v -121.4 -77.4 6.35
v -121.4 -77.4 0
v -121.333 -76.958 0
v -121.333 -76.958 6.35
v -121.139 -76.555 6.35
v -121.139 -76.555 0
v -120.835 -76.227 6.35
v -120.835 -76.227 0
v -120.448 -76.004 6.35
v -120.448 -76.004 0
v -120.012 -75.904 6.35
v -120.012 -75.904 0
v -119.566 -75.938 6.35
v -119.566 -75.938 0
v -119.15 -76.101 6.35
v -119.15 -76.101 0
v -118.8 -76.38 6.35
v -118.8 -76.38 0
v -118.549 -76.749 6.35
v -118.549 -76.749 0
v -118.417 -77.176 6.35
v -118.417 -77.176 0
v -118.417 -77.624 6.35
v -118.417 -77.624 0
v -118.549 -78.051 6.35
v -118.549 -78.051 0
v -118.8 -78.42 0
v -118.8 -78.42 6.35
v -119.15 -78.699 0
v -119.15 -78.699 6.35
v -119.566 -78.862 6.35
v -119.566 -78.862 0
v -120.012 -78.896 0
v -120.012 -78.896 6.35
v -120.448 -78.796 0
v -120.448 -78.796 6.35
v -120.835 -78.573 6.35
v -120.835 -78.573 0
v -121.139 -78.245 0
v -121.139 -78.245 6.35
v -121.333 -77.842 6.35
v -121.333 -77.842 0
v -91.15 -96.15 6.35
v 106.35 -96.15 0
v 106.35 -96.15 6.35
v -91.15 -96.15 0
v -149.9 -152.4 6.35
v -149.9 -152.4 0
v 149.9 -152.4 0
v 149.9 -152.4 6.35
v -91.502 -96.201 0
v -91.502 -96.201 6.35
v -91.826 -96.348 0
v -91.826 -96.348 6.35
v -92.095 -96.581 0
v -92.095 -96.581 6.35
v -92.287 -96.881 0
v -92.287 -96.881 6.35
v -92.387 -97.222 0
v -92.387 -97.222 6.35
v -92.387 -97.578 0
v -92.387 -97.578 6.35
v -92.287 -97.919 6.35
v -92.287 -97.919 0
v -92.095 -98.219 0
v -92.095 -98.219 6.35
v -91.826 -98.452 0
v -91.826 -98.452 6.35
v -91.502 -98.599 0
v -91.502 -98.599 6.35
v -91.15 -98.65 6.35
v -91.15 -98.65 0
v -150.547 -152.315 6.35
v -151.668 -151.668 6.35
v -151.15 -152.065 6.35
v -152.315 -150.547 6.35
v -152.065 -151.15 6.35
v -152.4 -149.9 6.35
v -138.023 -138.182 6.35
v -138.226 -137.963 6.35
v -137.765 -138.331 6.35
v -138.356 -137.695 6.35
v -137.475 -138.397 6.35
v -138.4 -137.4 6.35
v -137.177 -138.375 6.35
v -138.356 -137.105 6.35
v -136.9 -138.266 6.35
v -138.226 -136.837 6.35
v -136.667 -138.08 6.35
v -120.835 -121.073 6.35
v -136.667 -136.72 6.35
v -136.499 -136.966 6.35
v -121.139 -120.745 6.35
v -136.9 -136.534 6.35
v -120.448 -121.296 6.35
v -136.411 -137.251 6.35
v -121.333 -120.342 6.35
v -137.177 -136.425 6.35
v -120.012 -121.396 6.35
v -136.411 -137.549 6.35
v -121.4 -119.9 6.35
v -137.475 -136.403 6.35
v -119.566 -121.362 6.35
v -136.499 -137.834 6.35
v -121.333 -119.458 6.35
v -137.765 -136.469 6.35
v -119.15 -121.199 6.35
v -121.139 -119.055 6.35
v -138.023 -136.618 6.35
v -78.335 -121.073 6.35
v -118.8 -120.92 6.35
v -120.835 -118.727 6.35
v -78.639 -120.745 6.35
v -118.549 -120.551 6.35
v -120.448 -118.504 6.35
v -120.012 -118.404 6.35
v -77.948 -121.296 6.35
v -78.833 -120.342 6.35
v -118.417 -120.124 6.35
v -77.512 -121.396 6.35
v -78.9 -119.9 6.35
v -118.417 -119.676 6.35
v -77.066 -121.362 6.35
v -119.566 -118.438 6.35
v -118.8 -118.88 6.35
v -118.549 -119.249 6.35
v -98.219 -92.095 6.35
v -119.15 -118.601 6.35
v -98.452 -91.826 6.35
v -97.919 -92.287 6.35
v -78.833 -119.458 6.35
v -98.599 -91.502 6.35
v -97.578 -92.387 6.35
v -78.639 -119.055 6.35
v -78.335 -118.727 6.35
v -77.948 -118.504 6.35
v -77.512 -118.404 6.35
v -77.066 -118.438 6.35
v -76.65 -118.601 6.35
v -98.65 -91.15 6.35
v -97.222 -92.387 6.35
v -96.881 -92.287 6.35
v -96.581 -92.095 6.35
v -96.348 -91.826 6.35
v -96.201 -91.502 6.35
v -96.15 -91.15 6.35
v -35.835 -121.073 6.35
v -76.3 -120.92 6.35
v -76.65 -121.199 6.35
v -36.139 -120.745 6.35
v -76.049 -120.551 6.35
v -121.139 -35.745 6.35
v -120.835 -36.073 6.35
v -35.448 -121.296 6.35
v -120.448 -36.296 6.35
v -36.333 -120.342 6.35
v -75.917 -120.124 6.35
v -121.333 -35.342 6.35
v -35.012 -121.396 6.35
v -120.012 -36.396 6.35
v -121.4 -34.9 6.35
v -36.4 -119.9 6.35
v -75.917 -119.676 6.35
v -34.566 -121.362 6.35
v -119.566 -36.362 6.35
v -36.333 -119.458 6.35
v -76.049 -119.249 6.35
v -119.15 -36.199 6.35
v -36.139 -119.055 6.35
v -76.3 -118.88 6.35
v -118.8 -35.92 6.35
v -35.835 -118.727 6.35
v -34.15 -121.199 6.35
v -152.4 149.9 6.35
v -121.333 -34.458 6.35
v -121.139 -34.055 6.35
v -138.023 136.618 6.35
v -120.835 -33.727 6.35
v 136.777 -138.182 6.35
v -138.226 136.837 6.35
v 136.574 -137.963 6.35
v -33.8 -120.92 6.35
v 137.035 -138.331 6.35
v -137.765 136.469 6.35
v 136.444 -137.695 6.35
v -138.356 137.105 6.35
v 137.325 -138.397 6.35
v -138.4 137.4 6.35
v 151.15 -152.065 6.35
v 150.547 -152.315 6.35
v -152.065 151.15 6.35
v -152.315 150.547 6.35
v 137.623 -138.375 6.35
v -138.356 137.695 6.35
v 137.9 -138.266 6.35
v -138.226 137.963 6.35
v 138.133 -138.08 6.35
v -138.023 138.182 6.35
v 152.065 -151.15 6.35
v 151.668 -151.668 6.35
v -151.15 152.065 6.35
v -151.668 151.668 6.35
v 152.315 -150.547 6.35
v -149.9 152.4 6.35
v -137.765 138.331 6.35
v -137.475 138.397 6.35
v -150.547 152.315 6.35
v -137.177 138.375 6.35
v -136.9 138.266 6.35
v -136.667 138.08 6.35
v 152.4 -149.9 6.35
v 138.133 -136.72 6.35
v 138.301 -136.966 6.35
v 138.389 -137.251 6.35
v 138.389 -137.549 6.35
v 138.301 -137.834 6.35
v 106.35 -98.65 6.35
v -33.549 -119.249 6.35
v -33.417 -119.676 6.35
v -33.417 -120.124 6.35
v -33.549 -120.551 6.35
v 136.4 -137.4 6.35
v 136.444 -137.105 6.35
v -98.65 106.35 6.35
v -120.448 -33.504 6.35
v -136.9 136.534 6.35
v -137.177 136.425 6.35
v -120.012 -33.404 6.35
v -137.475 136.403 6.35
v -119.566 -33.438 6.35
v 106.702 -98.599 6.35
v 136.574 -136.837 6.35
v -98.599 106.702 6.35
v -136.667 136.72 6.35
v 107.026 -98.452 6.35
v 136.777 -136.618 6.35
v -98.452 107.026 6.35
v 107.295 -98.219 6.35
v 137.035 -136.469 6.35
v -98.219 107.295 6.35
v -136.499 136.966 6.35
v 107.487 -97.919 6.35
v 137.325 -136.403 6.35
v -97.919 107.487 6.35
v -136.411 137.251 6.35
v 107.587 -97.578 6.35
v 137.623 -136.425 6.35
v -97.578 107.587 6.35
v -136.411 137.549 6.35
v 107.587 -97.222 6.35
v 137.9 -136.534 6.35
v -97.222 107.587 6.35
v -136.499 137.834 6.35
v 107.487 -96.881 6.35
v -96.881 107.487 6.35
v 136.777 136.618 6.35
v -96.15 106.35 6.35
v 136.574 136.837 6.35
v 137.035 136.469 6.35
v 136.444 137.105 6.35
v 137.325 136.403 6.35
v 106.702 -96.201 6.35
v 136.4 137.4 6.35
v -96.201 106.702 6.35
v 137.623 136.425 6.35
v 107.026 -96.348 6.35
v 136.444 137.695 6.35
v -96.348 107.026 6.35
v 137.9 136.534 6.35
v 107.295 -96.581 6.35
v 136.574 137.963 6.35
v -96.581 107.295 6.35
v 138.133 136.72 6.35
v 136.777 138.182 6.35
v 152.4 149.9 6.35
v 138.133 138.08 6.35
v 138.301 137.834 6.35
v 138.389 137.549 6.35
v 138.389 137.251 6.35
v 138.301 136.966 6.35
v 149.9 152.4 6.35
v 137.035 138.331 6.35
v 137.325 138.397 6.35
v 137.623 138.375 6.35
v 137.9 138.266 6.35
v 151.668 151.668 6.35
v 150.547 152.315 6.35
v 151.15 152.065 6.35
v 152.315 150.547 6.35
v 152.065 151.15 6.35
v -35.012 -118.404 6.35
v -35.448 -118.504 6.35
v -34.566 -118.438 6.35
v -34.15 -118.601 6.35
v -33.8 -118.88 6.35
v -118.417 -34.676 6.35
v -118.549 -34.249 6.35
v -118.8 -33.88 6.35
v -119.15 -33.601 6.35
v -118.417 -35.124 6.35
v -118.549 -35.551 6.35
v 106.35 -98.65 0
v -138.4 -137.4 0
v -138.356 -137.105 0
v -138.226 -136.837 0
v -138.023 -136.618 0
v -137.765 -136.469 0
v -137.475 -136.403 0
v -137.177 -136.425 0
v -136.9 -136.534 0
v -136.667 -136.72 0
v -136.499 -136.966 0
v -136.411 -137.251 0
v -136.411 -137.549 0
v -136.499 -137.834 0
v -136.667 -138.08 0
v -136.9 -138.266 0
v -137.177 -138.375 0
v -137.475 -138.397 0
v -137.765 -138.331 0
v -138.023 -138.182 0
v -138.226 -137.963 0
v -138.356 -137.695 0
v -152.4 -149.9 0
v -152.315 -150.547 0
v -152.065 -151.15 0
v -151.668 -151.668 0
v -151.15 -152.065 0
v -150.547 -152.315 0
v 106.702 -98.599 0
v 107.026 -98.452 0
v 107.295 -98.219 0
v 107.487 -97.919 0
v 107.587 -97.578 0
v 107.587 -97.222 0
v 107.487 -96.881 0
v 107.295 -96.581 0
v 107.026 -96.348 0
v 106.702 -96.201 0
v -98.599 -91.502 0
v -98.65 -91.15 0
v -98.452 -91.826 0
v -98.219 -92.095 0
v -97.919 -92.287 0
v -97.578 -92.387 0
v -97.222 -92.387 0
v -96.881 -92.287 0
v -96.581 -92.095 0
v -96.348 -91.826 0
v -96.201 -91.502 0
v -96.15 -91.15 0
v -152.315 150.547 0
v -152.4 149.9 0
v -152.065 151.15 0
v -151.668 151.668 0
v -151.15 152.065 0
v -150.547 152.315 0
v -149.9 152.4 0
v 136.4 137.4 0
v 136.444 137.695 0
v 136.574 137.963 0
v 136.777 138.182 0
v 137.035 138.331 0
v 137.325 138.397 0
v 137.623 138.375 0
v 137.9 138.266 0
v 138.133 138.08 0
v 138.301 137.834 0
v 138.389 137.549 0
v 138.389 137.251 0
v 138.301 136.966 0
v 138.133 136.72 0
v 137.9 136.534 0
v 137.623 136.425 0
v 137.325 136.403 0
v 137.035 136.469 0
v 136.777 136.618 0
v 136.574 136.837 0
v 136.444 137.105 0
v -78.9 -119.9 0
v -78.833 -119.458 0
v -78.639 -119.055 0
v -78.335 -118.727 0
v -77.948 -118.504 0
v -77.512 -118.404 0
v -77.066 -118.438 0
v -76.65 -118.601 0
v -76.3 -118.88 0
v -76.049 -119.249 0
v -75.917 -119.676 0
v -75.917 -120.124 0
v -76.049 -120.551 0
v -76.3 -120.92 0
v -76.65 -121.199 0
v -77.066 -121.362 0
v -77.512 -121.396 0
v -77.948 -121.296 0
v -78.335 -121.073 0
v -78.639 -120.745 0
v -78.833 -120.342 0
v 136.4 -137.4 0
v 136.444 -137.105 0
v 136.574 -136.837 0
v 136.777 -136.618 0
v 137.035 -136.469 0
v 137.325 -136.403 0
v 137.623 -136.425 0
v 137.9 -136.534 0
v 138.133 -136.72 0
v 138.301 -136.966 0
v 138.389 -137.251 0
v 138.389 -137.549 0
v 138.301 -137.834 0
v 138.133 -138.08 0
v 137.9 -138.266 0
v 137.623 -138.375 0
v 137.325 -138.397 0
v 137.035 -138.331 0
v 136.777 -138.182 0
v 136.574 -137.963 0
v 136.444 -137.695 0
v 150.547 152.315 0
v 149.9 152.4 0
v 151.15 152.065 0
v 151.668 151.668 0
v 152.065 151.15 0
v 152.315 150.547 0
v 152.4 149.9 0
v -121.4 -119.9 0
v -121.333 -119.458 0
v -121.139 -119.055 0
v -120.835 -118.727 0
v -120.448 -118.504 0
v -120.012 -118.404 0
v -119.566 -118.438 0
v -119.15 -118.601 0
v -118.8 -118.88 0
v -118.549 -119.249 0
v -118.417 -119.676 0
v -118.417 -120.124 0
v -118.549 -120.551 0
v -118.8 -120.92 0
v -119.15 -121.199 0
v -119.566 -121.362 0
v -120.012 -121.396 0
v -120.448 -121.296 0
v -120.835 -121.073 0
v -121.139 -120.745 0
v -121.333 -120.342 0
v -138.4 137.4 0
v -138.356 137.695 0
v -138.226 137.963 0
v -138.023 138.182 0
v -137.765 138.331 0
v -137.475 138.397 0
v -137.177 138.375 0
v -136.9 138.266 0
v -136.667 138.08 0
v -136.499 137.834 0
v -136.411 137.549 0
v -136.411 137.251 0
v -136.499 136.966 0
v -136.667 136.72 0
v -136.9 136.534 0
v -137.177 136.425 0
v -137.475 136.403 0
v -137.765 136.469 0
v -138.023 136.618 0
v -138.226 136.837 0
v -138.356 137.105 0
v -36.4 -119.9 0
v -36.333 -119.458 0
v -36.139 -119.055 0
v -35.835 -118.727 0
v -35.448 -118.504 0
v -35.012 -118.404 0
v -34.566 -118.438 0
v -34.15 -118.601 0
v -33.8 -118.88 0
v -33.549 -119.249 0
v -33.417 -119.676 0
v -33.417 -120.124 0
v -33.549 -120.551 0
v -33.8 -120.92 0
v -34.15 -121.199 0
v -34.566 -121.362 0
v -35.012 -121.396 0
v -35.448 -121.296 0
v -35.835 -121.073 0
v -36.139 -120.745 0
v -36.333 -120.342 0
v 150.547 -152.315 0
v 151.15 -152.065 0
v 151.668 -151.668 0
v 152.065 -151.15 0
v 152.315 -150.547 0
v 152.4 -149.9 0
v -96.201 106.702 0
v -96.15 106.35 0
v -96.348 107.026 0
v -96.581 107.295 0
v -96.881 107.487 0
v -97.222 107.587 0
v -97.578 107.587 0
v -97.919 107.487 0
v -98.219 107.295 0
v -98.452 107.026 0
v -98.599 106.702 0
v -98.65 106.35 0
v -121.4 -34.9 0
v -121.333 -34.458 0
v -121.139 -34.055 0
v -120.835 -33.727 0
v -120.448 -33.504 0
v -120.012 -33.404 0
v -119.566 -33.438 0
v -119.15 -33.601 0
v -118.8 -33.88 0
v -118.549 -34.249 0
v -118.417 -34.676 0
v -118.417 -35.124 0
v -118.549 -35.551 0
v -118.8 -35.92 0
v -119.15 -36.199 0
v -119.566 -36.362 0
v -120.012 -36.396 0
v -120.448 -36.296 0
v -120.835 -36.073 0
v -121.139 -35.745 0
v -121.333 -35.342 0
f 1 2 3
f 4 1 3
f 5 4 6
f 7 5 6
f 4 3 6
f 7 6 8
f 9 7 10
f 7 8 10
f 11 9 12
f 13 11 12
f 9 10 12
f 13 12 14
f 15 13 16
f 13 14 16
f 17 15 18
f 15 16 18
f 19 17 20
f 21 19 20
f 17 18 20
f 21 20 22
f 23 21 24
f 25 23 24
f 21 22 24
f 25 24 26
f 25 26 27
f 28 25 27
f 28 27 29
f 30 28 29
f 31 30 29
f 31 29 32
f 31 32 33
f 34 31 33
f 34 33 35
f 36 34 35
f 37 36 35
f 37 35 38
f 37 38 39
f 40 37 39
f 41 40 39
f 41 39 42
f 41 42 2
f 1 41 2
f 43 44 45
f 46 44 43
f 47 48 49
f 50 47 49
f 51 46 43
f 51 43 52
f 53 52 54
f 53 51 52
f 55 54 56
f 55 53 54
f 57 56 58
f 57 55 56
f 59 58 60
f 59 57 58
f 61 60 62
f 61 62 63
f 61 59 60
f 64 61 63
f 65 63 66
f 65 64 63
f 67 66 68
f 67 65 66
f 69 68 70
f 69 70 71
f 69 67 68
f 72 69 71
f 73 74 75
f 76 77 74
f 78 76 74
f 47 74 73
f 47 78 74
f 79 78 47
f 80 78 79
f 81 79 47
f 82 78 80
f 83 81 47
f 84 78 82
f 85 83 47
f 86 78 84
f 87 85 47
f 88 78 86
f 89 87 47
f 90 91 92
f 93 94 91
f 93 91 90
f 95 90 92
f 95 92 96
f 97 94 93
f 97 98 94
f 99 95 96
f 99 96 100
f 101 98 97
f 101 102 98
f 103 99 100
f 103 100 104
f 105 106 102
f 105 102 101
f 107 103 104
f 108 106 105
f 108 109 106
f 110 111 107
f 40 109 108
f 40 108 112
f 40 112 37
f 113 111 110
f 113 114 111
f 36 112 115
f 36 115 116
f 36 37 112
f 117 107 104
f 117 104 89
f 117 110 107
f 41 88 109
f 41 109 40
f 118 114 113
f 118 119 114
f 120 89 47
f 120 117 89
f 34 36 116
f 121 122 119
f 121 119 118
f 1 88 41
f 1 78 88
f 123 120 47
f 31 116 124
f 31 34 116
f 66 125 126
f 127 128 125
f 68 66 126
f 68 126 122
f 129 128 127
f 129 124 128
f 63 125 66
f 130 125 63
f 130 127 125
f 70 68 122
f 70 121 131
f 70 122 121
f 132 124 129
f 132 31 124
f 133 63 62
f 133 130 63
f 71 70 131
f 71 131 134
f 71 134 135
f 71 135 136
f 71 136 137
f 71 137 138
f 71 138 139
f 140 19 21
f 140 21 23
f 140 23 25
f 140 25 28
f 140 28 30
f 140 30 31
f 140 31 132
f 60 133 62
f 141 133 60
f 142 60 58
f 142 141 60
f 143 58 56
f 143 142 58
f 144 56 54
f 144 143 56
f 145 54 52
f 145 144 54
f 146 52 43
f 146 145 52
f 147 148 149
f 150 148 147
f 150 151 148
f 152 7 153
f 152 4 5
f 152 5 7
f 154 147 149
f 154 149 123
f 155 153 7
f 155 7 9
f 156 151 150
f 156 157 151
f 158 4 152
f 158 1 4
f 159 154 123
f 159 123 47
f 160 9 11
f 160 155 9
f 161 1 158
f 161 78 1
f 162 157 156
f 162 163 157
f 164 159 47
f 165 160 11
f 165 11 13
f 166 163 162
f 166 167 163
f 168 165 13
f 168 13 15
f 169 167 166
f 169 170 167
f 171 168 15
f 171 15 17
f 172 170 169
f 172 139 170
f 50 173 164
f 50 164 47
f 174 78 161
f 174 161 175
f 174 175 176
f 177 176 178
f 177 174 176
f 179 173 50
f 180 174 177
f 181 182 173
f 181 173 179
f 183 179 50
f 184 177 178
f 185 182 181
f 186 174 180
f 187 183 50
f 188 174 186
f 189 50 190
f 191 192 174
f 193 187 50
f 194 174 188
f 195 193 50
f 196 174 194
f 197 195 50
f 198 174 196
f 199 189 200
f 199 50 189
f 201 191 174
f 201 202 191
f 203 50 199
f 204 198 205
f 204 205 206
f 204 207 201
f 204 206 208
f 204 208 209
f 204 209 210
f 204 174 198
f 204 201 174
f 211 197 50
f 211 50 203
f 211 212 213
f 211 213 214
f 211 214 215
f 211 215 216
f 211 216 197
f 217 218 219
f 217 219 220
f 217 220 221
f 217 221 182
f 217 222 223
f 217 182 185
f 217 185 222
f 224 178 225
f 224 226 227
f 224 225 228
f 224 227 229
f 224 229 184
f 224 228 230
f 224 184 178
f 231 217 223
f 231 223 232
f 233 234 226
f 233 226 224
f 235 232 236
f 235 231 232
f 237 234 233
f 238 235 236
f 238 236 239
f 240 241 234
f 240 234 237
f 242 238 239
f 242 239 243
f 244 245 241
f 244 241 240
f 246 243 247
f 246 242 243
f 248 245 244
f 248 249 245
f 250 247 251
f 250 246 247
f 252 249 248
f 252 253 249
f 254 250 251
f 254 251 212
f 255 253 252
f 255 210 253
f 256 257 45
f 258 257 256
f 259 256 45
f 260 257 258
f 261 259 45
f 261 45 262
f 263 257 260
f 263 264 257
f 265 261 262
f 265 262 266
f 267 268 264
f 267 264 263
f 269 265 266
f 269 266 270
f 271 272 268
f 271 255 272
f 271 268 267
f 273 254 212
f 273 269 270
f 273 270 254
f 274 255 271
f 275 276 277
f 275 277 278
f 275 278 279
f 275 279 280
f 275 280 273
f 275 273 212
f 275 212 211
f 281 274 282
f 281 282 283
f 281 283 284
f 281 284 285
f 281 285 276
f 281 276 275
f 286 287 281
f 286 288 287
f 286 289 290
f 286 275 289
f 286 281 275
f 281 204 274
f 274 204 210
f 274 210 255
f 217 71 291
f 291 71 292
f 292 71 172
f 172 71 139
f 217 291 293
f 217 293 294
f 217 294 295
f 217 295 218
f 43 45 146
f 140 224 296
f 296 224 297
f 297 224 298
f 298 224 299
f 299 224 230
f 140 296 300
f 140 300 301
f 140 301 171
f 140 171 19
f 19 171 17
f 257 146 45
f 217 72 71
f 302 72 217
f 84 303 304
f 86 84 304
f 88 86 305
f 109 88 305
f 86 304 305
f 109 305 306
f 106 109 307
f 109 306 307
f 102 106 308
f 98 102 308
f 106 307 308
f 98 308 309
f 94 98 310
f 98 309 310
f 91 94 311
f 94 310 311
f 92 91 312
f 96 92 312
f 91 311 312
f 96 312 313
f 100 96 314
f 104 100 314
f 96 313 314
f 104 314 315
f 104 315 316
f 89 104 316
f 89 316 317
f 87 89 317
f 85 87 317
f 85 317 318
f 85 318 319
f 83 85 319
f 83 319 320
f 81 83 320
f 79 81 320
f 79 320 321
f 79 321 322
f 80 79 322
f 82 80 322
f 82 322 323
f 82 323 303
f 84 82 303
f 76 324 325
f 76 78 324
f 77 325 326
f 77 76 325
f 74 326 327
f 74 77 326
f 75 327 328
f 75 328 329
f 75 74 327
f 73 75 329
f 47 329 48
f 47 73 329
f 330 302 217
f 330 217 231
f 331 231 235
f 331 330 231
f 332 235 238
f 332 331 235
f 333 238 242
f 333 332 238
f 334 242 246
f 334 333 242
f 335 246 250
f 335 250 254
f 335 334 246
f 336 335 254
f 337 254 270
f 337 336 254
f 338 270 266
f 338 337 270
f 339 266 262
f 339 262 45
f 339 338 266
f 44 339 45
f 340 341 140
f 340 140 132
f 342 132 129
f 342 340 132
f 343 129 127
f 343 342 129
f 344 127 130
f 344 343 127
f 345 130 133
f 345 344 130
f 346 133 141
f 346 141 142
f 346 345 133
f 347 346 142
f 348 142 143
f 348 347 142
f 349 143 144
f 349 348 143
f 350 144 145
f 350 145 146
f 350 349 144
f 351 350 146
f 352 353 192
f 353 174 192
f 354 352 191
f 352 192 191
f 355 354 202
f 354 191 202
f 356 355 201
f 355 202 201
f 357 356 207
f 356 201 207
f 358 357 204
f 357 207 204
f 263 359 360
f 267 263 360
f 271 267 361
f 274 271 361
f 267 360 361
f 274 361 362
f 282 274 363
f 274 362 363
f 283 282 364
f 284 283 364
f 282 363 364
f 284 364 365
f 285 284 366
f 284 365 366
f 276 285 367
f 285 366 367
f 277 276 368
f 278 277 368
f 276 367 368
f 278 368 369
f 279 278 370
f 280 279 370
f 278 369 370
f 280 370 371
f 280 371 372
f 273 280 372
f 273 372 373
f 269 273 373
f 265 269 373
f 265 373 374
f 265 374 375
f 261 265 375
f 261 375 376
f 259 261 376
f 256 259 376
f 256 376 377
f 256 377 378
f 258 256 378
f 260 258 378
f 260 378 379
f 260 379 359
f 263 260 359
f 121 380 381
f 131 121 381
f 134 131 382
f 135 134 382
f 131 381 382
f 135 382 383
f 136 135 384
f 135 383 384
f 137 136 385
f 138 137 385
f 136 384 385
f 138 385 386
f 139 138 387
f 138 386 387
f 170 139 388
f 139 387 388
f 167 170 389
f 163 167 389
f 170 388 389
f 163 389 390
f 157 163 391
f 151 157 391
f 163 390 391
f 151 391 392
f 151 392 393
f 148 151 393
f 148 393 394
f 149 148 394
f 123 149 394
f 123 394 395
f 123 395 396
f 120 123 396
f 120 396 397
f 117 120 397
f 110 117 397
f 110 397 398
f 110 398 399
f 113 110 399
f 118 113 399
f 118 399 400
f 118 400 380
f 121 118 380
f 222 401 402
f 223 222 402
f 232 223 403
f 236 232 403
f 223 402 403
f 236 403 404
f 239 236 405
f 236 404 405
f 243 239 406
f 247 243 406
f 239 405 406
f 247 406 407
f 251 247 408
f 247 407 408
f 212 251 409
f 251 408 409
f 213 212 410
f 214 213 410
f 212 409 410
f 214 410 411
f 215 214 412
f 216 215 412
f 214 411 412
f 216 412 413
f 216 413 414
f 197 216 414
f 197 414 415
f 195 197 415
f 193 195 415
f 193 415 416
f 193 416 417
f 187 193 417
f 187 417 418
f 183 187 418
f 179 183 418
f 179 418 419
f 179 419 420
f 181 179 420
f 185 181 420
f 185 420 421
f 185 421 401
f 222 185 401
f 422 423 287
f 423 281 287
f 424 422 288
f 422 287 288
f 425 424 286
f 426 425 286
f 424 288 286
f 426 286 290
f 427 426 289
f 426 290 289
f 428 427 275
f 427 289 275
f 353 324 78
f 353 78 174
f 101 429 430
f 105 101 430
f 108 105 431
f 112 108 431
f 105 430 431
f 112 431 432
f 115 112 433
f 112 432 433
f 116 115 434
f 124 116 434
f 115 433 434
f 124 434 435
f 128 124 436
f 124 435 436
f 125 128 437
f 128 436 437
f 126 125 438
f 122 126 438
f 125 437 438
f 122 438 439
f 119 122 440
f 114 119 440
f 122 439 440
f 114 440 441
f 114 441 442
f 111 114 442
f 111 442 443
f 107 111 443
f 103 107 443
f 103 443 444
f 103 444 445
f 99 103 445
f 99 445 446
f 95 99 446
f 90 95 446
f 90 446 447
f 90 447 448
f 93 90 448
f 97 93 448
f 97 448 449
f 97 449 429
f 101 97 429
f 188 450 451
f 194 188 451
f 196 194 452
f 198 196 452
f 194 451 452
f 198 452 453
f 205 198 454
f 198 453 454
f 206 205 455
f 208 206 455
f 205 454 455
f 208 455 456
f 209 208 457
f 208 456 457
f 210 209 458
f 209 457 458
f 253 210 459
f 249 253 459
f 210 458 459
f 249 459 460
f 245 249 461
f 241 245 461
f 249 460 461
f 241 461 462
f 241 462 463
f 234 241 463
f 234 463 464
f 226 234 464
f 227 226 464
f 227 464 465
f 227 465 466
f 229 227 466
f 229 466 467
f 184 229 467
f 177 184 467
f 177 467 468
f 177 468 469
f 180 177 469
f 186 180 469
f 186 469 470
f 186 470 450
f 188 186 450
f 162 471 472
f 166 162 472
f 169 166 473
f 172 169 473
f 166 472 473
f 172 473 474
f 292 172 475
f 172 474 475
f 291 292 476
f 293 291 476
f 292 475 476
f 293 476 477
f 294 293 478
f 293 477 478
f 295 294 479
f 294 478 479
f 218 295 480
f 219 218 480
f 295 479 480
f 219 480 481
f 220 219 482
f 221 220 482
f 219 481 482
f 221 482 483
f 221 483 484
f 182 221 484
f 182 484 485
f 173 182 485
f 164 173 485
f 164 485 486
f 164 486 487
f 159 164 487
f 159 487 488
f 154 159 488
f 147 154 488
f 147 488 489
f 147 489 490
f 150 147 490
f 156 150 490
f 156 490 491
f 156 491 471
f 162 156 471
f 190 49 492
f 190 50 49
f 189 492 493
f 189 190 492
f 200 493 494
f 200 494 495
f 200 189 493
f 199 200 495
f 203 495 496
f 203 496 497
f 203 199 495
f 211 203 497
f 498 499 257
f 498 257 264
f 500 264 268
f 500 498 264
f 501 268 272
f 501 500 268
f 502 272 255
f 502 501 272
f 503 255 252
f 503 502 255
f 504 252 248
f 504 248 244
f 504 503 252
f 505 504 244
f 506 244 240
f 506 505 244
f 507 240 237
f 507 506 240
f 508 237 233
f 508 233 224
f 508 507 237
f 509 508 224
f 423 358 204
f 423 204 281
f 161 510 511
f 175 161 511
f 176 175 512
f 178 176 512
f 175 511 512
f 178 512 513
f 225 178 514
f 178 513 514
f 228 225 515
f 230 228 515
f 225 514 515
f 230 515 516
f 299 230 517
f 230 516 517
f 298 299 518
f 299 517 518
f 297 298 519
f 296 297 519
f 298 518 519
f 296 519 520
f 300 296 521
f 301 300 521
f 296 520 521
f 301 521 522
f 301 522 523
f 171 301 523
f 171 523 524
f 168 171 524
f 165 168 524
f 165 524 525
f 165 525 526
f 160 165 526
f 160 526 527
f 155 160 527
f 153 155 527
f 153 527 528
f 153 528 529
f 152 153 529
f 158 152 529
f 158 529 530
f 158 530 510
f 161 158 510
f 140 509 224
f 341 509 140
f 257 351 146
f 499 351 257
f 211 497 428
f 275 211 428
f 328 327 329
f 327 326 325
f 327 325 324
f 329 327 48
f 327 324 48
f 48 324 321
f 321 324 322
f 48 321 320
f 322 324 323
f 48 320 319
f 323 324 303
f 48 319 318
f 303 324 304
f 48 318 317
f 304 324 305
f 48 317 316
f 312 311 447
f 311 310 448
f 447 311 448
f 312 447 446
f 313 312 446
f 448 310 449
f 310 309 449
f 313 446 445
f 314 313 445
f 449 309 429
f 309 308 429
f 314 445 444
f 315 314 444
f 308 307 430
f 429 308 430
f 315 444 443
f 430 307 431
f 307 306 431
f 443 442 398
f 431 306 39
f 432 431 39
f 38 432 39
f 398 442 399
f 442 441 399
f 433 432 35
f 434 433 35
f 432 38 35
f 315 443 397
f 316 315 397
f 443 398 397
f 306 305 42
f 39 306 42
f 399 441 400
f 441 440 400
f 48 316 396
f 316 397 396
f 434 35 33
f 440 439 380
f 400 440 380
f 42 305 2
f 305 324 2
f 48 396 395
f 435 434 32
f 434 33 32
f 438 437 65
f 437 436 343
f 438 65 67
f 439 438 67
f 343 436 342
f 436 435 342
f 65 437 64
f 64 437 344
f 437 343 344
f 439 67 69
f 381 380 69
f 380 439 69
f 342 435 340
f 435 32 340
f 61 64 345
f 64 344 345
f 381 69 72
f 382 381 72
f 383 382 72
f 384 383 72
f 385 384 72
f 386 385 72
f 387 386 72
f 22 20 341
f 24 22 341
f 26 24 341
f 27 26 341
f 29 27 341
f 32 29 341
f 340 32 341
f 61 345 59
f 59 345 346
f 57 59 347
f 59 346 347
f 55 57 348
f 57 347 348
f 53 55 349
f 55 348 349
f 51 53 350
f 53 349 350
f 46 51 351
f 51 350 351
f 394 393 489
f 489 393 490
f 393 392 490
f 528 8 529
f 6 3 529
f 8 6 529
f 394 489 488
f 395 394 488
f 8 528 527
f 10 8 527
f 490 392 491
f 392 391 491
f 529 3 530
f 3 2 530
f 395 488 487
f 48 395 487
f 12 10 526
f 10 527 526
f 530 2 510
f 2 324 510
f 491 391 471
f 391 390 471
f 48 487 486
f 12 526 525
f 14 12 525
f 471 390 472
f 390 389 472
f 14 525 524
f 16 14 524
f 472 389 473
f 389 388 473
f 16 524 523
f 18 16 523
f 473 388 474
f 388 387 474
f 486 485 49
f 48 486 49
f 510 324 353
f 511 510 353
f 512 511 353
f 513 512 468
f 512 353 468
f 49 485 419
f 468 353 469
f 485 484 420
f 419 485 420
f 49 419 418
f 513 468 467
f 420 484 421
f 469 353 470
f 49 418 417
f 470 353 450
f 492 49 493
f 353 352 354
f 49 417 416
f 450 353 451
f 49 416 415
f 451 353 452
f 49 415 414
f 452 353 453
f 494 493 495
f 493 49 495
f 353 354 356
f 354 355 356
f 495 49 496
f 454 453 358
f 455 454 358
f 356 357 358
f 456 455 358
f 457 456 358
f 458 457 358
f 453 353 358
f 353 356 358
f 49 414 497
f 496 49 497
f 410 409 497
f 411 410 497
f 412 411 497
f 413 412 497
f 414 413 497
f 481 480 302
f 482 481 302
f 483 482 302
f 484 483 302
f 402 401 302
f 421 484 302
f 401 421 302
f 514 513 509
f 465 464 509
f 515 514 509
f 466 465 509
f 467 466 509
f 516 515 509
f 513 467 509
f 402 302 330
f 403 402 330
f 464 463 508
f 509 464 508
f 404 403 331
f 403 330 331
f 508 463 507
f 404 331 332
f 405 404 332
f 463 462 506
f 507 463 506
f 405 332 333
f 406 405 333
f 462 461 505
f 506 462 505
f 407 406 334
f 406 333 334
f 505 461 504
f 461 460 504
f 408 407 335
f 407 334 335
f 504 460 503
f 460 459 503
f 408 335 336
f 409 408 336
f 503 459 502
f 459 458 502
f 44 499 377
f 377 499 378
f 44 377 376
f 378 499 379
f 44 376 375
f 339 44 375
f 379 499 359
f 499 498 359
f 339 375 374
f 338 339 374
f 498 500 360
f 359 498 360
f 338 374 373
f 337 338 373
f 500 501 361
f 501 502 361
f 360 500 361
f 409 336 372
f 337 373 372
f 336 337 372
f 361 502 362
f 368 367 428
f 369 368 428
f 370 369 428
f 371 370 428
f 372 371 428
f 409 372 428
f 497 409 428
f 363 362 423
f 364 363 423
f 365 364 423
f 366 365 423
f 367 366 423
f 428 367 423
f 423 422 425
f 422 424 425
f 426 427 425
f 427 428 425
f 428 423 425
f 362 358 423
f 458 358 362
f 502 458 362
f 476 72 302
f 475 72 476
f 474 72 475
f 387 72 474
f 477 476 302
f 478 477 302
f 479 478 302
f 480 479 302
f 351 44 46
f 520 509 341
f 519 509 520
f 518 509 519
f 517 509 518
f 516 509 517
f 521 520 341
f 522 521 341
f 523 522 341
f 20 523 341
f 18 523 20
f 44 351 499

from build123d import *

# Parameters (mm, degrees)
SKETCH1_W                = 304.8
SKETCH1_H                = 304.8
BOSS_EXTRUDE1_DEPTH      = 6.35
M3_CLEARANCE_HOLE2_D     = 2
FILLET1_R                = 2.5
M3_CLEARANCE_SLOT1_DEPTH = 6.35
M3_CLEARANCE_SLOT2_DEPTH = 6.35
M3_CLEARANCE_HOLE1_D     = 3


# Read off the part's stored shape, not the designer's step: M3 Clearance Slot1, M3 Clearance Slot2
with BuildPart() as part:
    # Sketch1 → Boss-Extrude1 (new body)
    with BuildSketch(Plane.XY):
        Rectangle(SKETCH1_W, SKETCH1_H)
    extrude(amount=BOSS_EXTRUDE1_DEPTH)

    # M3 Clearance Hole2 (through all)
    with Locations(Plane.XY.offset(6.35)):
        with Locations((137.4, 137.4), (-137.4, -137.4), (137.4, -137.4), (-137.4, 137.4)):
            Hole(M3_CLEARANCE_HOLE2_D / 2)

    # Fillet1
    fillet1_edges = [part.edges().sort_by_distance(p)[0] for p in [
        (152.4, -152.4, 3.175),
        (-152.4, -152.4, 3.175),
        (-152.4, 152.4, 3.175),
        (152.4, 152.4, 3.175),
    ]]
    fillet(fillet1_edges, radius=FILLET1_R)

    # M3 Clearance Slot1 outline → M3 Clearance Slot1 (cut)
    with BuildSketch(Plane.XY):
        with BuildLine():
            Line((-91.15, -98.65), (106.35, -98.65))
            ThreePointArc((106.35, -98.65), (107.6, -97.4), (106.35, -96.15))
            Line((106.35, -96.15), (-91.15, -96.15))
            ThreePointArc((-91.15, -96.15), (-92.4, -97.4), (-91.15, -98.65))
        make_face()
    extrude(amount=M3_CLEARANCE_SLOT1_DEPTH, mode=Mode.SUBTRACT)

    # M3 Clearance Slot2 outline → M3 Clearance Slot2 (cut)
    with BuildSketch(Plane.XY):
        with BuildLine():
            Line((-98.65, 106.35), (-98.65, -91.15))
            ThreePointArc((-98.65, -91.15), (-97.4, -92.4), (-96.15, -91.15))
            Line((-96.15, -91.15), (-96.15, 106.35))
            ThreePointArc((-96.15, 106.35), (-97.4, 107.6), (-98.65, 106.35))
        make_face()
    extrude(amount=M3_CLEARANCE_SLOT2_DEPTH, mode=Mode.SUBTRACT)

    # M3 Clearance Hole1 (through all)
    with Locations(Plane.XY.offset(6.35)):
        with Locations((-34.9, -119.9), (-77.4, -119.9), (-119.9, -119.9), (-119.9, -77.4), (-119.9, -34.9)):
            Hole(M3_CLEARANCE_HOLE1_D / 2)


solid = part.part
